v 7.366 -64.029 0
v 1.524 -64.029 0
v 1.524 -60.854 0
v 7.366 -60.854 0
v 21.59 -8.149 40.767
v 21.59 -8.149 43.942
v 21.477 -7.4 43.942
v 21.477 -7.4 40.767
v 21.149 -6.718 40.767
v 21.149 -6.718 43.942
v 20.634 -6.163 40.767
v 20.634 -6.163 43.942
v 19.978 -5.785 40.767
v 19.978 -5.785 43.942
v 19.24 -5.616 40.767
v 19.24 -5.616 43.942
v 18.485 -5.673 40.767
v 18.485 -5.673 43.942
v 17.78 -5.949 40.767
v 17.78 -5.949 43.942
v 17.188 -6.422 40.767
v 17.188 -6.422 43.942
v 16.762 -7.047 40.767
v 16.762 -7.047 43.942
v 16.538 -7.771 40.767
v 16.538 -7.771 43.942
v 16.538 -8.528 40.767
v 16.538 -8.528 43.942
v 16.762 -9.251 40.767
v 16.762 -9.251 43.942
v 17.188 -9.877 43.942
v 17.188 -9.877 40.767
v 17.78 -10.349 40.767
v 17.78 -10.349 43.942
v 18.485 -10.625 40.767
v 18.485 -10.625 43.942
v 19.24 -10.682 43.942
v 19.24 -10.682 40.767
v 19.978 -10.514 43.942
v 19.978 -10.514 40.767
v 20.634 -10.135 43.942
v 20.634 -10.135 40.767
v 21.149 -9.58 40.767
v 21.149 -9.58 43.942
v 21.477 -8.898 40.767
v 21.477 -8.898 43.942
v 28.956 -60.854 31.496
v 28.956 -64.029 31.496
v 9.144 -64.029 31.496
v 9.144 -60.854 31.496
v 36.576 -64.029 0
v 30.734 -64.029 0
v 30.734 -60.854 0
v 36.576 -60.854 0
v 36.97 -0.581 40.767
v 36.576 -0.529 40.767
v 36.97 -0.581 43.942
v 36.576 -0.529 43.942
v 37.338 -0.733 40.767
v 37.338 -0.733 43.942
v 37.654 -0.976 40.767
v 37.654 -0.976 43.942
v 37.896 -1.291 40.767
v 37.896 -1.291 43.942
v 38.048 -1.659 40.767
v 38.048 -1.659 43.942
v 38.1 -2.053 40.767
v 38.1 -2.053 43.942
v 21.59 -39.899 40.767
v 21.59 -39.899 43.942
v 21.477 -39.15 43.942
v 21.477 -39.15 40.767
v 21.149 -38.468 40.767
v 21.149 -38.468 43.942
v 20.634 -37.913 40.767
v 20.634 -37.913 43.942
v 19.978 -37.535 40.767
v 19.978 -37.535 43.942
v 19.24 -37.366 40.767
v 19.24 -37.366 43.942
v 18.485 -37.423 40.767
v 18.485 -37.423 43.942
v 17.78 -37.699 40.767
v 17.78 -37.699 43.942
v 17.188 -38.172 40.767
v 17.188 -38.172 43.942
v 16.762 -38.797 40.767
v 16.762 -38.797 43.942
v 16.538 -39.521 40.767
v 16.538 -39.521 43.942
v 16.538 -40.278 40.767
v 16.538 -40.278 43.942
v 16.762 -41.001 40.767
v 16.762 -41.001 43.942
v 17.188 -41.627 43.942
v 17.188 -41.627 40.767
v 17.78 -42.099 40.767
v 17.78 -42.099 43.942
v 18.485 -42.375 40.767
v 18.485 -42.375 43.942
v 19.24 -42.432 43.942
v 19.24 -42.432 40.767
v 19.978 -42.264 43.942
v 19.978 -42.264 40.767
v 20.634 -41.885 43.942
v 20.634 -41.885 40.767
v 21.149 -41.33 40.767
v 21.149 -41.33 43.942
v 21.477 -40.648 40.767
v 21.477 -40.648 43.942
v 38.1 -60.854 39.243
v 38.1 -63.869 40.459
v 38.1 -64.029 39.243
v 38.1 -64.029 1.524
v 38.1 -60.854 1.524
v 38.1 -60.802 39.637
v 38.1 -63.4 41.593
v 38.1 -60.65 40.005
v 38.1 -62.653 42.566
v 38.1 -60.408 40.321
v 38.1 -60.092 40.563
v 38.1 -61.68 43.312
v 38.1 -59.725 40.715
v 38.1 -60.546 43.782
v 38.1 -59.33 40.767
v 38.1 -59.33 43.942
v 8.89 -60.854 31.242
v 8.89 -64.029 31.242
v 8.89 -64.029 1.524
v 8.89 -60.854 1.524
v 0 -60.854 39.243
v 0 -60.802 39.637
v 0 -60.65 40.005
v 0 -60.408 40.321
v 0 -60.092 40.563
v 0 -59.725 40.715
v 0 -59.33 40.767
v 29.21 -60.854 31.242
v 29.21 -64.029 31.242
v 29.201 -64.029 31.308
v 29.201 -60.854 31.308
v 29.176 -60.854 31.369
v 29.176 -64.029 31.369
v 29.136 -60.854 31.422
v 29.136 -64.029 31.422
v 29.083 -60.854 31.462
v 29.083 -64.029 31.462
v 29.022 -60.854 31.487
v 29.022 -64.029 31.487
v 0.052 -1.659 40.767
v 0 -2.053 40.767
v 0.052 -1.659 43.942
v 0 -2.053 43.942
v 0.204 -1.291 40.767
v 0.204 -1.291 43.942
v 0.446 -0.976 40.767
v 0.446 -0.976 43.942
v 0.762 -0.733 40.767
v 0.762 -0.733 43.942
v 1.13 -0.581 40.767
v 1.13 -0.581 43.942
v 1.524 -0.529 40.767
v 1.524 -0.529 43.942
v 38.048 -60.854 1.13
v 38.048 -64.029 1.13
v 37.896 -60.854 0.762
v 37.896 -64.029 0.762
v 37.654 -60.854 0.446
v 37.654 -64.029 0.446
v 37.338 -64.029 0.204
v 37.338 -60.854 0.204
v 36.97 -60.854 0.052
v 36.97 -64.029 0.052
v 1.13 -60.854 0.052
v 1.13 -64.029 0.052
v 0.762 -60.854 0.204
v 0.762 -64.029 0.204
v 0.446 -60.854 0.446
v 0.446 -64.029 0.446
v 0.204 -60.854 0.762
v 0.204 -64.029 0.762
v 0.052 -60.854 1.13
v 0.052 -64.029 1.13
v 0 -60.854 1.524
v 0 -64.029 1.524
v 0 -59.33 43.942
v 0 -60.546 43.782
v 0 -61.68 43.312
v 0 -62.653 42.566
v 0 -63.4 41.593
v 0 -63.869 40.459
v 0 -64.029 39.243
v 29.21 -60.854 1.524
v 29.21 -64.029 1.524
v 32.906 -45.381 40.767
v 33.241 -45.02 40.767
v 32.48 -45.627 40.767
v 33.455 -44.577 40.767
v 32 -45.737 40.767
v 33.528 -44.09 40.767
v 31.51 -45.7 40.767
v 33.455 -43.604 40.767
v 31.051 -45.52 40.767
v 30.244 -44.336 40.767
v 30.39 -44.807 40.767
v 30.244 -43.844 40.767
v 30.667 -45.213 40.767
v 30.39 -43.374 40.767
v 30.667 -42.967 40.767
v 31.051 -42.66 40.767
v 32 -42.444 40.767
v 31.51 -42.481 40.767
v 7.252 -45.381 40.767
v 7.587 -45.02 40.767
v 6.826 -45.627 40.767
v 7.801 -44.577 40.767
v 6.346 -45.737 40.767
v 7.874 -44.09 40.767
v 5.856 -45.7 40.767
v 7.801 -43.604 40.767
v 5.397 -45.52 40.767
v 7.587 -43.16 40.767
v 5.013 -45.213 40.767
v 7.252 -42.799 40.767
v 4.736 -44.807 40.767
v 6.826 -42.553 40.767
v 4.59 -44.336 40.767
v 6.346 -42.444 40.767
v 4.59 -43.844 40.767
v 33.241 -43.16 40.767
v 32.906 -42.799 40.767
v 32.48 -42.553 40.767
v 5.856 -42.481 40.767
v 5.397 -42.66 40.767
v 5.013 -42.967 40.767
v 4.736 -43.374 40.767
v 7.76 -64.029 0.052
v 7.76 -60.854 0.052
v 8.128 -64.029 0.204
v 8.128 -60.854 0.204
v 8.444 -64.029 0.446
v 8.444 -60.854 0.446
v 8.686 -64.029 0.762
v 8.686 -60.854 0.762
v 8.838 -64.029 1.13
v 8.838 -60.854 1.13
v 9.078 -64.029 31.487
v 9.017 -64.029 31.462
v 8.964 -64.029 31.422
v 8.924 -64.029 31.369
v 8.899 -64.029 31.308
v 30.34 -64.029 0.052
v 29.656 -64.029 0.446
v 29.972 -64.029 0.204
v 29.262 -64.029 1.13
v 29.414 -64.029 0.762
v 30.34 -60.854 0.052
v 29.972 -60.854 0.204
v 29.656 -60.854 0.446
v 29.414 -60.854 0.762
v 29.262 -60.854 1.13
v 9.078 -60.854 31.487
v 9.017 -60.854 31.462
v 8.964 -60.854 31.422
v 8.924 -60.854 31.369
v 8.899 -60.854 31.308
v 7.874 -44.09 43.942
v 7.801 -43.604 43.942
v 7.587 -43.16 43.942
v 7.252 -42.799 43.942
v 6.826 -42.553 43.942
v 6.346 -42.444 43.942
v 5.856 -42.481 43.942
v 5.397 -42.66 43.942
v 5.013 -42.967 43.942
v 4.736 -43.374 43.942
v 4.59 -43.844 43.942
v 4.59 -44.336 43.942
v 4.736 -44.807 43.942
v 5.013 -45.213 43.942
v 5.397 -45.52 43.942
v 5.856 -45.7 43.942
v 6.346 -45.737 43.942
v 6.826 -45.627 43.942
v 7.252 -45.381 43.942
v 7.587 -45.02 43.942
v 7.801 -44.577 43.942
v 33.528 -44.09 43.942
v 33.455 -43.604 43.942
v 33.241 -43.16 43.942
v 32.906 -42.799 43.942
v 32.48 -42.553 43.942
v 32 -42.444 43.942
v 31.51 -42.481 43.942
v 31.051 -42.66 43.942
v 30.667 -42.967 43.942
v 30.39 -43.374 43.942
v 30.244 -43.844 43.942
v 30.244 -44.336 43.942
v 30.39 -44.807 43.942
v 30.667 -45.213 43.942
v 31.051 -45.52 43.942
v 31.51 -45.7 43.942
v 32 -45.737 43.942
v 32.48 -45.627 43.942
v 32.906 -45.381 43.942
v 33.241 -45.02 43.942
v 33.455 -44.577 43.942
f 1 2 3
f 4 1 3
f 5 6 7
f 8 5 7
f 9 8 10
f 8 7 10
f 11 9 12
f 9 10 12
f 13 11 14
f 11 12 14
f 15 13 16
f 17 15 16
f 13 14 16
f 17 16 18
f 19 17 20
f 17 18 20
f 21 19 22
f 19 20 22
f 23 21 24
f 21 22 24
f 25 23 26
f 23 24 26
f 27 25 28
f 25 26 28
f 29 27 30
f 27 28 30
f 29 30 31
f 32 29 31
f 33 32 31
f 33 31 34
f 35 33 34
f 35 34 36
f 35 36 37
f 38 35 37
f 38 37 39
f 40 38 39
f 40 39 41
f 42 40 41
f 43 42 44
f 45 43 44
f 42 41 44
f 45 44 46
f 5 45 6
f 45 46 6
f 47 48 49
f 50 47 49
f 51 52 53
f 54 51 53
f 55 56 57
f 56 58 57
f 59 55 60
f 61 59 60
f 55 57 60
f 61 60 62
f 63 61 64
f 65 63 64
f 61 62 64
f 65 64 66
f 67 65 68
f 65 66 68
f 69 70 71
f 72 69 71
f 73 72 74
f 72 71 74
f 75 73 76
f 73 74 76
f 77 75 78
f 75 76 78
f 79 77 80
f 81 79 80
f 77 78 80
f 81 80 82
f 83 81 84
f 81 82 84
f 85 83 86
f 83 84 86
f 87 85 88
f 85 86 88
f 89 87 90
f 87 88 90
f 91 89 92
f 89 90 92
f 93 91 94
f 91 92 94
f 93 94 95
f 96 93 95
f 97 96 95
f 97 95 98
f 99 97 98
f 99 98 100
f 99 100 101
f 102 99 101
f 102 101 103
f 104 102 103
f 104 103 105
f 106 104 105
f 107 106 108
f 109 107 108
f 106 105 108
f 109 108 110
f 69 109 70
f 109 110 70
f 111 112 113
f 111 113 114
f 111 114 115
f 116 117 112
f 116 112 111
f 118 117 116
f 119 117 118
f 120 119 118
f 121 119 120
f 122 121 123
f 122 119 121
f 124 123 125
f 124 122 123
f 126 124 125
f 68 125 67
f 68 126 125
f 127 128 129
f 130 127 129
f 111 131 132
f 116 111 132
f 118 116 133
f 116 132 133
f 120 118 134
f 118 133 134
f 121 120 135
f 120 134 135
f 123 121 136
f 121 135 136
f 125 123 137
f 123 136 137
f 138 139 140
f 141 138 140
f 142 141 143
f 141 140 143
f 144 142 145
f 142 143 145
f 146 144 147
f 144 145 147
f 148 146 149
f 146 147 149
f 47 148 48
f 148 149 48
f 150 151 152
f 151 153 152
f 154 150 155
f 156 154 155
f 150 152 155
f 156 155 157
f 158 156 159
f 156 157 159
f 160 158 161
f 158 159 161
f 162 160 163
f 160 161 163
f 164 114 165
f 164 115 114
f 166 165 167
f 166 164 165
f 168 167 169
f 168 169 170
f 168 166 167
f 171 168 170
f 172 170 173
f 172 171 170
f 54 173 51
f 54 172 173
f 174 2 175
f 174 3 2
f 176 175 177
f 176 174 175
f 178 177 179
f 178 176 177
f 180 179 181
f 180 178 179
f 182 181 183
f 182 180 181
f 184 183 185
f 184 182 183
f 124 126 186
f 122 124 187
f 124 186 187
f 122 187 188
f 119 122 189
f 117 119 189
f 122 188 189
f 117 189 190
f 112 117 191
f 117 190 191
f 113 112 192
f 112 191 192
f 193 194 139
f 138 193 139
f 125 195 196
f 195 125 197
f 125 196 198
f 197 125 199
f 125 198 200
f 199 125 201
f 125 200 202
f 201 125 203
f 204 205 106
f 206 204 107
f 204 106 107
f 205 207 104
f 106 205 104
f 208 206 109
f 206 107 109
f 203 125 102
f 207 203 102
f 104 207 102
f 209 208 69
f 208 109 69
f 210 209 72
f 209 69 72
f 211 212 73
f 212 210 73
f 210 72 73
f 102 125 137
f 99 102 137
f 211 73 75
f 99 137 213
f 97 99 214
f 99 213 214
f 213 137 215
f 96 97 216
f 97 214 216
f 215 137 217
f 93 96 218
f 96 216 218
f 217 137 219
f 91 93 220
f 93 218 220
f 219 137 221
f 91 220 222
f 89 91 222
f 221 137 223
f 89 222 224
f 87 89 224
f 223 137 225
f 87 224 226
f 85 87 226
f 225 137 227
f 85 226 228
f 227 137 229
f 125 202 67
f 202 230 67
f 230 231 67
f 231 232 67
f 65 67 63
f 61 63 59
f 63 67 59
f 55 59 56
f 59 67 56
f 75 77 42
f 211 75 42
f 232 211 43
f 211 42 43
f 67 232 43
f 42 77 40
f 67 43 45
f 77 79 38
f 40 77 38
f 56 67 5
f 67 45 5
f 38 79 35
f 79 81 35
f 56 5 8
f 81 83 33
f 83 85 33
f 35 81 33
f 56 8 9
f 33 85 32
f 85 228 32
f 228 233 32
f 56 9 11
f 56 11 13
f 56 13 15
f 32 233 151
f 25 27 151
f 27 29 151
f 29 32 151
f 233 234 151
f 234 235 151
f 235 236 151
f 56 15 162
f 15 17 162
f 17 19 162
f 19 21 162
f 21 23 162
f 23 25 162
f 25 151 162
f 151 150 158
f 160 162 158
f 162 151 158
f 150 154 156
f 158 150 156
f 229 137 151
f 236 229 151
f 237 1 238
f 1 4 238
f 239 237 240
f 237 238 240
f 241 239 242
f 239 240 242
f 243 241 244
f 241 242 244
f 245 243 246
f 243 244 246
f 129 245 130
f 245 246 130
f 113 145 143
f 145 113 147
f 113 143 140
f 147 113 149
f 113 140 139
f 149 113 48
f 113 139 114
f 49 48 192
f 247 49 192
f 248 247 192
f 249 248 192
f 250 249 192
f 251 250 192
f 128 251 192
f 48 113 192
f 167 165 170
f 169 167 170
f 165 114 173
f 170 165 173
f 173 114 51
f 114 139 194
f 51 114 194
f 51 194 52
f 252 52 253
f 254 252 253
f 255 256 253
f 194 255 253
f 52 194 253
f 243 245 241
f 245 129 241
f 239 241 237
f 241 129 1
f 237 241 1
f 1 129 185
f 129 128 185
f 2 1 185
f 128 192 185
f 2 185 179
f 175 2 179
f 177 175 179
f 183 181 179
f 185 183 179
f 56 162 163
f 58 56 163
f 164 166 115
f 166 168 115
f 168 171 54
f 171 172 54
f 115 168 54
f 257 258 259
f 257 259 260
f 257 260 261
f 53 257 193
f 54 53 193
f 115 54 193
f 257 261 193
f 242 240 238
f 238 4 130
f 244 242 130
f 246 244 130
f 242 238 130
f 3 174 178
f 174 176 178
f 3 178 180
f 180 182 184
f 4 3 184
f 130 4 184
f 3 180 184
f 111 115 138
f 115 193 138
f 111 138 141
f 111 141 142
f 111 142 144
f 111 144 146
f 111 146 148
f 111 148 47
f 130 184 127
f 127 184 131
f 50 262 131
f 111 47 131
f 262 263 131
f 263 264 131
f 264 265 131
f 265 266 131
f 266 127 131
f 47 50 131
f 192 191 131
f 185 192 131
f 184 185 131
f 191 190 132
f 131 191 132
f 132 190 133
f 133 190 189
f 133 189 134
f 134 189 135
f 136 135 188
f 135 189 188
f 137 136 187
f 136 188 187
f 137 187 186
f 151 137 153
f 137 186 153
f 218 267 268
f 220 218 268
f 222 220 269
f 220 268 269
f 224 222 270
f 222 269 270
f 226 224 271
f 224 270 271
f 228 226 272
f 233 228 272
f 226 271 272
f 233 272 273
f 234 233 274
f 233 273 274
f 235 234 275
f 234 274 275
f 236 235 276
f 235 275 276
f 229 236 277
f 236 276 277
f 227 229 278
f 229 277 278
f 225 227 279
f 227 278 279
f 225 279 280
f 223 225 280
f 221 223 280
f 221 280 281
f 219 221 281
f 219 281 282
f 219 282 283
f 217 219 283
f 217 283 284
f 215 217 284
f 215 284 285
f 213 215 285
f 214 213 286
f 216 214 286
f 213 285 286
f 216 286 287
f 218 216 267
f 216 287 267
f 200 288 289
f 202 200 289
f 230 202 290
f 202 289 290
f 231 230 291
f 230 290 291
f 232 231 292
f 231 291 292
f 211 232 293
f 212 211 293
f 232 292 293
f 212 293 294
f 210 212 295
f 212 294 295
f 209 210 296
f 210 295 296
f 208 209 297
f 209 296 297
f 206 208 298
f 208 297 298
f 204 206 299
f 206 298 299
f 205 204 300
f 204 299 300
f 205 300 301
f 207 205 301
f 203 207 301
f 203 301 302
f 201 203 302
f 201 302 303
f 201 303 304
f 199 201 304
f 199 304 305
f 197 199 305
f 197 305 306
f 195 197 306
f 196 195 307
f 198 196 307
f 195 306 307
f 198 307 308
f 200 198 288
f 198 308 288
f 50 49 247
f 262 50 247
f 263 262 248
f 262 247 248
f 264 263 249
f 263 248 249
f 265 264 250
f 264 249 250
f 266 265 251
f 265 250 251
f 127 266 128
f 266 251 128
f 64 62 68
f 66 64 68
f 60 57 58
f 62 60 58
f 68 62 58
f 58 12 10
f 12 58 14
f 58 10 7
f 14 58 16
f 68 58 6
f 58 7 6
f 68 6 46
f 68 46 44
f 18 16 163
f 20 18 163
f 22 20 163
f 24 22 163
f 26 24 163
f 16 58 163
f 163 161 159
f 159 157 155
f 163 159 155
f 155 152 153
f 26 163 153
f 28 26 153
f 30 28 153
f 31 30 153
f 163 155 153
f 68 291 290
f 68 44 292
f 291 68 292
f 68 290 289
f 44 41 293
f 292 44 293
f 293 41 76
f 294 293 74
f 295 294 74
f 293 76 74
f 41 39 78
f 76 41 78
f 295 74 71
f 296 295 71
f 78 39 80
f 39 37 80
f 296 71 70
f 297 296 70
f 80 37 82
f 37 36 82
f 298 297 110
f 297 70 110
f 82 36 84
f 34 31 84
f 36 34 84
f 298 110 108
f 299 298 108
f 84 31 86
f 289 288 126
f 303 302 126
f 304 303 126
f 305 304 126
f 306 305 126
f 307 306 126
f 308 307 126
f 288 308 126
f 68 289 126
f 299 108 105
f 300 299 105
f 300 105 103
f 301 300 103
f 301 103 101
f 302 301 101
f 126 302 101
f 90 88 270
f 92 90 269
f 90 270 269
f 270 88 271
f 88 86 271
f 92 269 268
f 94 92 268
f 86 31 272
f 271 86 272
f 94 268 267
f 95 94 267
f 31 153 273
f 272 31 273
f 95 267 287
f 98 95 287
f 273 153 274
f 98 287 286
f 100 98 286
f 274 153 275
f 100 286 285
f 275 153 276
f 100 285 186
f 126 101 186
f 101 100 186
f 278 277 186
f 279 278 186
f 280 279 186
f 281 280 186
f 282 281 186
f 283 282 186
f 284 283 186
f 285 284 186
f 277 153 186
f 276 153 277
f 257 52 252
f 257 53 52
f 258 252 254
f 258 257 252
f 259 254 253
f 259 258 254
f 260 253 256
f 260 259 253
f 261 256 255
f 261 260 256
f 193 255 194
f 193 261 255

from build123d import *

# Parameters (mm, degrees)
F1_DEPTH = 38.1
F3_DEPTH = 3.175
F4_R     = 1.524
F5_R     = 2.54
F5_R_2   = 1.651
F6_DEPTH = 3.175


with BuildPart() as f1:
    # F0 (on Right) → F1 (new body)
    with BuildSketch(Plane.YZ):
        with BuildLine():
            Line((-64.0291666667, 0), (-60.8541666667, 0))
            Line((-60.8541666667, 0), (-60.8541666667, 39.243))
            ThreePointArc((-60.8541666667, 39.243), (-60.4077974012, 40.3206307345), (-59.3301666667, 40.767))
            Line((-59.3301666667, 40.767), (-0.5291666667, 40.767))
            Line((-0.5291666667, 40.767), (-0.5291666667, 43.942))
            Line((-0.5291666667, 43.942), (-59.3301666667, 43.942))
            ThreePointArc((-59.3301666667, 43.942), (-62.6528614315, 42.5656947648), (-64.0291666667, 39.243))
            Line((-64.0291666667, 39.243), (-64.0291666667, 0))
        make_face()
    extrude(amount=F1_DEPTH)

    # F2 (on face) → F3 (cut, through all)
    with BuildSketch(Plane.XZ.offset(64.0291666667)):
        with BuildLine():
            Line((8.89, 31.242), (8.89, 0))
            Line((8.89, 0), (29.21, 0))
            Line((29.21, 0), (29.21, 31.242))
            ThreePointArc((29.21, 31.242), (29.1356051224, 31.4216051224), (28.956, 31.496))
            Line((28.956, 31.496), (9.144, 31.496))
            ThreePointArc((9.144, 31.496), (8.9643948776, 31.4216051224), (8.89, 31.242))
        make_face()
    extrude(amount=-F3_DEPTH, mode=Mode.SUBTRACT)

    # F4
    f4_edges = [f1.edges().sort_by_distance(p)[0] for p in [
        (8.89, -62.441667, 0),
        (0, -62.441667, 0),
        (29.21, -62.441667, 0),
        (38.1, -62.441667, 0),
        (38.1, -0.529167, 42.3545),
        (0, -0.529167, 42.3545),
    ]]
    fillet(f4_edges, radius=F4_R)

    # F5 (on face) → F6 (cut, through all)
    with BuildSketch(Plane.XY.offset(43.942)):
        with Locations((19.05, -8.1491666667)):
            Circle(F5_R)
        with Locations((19.05, -39.8991666667)):
            Circle(F5_R)
        with Locations((31.877, -44.0901666667)):
            Circle(F5_R_2)
        with Locations((6.223, -44.0901666667)):
            Circle(F5_R_2)
    extrude(amount=-F6_DEPTH, mode=Mode.SUBTRACT)


solid = f1.part
